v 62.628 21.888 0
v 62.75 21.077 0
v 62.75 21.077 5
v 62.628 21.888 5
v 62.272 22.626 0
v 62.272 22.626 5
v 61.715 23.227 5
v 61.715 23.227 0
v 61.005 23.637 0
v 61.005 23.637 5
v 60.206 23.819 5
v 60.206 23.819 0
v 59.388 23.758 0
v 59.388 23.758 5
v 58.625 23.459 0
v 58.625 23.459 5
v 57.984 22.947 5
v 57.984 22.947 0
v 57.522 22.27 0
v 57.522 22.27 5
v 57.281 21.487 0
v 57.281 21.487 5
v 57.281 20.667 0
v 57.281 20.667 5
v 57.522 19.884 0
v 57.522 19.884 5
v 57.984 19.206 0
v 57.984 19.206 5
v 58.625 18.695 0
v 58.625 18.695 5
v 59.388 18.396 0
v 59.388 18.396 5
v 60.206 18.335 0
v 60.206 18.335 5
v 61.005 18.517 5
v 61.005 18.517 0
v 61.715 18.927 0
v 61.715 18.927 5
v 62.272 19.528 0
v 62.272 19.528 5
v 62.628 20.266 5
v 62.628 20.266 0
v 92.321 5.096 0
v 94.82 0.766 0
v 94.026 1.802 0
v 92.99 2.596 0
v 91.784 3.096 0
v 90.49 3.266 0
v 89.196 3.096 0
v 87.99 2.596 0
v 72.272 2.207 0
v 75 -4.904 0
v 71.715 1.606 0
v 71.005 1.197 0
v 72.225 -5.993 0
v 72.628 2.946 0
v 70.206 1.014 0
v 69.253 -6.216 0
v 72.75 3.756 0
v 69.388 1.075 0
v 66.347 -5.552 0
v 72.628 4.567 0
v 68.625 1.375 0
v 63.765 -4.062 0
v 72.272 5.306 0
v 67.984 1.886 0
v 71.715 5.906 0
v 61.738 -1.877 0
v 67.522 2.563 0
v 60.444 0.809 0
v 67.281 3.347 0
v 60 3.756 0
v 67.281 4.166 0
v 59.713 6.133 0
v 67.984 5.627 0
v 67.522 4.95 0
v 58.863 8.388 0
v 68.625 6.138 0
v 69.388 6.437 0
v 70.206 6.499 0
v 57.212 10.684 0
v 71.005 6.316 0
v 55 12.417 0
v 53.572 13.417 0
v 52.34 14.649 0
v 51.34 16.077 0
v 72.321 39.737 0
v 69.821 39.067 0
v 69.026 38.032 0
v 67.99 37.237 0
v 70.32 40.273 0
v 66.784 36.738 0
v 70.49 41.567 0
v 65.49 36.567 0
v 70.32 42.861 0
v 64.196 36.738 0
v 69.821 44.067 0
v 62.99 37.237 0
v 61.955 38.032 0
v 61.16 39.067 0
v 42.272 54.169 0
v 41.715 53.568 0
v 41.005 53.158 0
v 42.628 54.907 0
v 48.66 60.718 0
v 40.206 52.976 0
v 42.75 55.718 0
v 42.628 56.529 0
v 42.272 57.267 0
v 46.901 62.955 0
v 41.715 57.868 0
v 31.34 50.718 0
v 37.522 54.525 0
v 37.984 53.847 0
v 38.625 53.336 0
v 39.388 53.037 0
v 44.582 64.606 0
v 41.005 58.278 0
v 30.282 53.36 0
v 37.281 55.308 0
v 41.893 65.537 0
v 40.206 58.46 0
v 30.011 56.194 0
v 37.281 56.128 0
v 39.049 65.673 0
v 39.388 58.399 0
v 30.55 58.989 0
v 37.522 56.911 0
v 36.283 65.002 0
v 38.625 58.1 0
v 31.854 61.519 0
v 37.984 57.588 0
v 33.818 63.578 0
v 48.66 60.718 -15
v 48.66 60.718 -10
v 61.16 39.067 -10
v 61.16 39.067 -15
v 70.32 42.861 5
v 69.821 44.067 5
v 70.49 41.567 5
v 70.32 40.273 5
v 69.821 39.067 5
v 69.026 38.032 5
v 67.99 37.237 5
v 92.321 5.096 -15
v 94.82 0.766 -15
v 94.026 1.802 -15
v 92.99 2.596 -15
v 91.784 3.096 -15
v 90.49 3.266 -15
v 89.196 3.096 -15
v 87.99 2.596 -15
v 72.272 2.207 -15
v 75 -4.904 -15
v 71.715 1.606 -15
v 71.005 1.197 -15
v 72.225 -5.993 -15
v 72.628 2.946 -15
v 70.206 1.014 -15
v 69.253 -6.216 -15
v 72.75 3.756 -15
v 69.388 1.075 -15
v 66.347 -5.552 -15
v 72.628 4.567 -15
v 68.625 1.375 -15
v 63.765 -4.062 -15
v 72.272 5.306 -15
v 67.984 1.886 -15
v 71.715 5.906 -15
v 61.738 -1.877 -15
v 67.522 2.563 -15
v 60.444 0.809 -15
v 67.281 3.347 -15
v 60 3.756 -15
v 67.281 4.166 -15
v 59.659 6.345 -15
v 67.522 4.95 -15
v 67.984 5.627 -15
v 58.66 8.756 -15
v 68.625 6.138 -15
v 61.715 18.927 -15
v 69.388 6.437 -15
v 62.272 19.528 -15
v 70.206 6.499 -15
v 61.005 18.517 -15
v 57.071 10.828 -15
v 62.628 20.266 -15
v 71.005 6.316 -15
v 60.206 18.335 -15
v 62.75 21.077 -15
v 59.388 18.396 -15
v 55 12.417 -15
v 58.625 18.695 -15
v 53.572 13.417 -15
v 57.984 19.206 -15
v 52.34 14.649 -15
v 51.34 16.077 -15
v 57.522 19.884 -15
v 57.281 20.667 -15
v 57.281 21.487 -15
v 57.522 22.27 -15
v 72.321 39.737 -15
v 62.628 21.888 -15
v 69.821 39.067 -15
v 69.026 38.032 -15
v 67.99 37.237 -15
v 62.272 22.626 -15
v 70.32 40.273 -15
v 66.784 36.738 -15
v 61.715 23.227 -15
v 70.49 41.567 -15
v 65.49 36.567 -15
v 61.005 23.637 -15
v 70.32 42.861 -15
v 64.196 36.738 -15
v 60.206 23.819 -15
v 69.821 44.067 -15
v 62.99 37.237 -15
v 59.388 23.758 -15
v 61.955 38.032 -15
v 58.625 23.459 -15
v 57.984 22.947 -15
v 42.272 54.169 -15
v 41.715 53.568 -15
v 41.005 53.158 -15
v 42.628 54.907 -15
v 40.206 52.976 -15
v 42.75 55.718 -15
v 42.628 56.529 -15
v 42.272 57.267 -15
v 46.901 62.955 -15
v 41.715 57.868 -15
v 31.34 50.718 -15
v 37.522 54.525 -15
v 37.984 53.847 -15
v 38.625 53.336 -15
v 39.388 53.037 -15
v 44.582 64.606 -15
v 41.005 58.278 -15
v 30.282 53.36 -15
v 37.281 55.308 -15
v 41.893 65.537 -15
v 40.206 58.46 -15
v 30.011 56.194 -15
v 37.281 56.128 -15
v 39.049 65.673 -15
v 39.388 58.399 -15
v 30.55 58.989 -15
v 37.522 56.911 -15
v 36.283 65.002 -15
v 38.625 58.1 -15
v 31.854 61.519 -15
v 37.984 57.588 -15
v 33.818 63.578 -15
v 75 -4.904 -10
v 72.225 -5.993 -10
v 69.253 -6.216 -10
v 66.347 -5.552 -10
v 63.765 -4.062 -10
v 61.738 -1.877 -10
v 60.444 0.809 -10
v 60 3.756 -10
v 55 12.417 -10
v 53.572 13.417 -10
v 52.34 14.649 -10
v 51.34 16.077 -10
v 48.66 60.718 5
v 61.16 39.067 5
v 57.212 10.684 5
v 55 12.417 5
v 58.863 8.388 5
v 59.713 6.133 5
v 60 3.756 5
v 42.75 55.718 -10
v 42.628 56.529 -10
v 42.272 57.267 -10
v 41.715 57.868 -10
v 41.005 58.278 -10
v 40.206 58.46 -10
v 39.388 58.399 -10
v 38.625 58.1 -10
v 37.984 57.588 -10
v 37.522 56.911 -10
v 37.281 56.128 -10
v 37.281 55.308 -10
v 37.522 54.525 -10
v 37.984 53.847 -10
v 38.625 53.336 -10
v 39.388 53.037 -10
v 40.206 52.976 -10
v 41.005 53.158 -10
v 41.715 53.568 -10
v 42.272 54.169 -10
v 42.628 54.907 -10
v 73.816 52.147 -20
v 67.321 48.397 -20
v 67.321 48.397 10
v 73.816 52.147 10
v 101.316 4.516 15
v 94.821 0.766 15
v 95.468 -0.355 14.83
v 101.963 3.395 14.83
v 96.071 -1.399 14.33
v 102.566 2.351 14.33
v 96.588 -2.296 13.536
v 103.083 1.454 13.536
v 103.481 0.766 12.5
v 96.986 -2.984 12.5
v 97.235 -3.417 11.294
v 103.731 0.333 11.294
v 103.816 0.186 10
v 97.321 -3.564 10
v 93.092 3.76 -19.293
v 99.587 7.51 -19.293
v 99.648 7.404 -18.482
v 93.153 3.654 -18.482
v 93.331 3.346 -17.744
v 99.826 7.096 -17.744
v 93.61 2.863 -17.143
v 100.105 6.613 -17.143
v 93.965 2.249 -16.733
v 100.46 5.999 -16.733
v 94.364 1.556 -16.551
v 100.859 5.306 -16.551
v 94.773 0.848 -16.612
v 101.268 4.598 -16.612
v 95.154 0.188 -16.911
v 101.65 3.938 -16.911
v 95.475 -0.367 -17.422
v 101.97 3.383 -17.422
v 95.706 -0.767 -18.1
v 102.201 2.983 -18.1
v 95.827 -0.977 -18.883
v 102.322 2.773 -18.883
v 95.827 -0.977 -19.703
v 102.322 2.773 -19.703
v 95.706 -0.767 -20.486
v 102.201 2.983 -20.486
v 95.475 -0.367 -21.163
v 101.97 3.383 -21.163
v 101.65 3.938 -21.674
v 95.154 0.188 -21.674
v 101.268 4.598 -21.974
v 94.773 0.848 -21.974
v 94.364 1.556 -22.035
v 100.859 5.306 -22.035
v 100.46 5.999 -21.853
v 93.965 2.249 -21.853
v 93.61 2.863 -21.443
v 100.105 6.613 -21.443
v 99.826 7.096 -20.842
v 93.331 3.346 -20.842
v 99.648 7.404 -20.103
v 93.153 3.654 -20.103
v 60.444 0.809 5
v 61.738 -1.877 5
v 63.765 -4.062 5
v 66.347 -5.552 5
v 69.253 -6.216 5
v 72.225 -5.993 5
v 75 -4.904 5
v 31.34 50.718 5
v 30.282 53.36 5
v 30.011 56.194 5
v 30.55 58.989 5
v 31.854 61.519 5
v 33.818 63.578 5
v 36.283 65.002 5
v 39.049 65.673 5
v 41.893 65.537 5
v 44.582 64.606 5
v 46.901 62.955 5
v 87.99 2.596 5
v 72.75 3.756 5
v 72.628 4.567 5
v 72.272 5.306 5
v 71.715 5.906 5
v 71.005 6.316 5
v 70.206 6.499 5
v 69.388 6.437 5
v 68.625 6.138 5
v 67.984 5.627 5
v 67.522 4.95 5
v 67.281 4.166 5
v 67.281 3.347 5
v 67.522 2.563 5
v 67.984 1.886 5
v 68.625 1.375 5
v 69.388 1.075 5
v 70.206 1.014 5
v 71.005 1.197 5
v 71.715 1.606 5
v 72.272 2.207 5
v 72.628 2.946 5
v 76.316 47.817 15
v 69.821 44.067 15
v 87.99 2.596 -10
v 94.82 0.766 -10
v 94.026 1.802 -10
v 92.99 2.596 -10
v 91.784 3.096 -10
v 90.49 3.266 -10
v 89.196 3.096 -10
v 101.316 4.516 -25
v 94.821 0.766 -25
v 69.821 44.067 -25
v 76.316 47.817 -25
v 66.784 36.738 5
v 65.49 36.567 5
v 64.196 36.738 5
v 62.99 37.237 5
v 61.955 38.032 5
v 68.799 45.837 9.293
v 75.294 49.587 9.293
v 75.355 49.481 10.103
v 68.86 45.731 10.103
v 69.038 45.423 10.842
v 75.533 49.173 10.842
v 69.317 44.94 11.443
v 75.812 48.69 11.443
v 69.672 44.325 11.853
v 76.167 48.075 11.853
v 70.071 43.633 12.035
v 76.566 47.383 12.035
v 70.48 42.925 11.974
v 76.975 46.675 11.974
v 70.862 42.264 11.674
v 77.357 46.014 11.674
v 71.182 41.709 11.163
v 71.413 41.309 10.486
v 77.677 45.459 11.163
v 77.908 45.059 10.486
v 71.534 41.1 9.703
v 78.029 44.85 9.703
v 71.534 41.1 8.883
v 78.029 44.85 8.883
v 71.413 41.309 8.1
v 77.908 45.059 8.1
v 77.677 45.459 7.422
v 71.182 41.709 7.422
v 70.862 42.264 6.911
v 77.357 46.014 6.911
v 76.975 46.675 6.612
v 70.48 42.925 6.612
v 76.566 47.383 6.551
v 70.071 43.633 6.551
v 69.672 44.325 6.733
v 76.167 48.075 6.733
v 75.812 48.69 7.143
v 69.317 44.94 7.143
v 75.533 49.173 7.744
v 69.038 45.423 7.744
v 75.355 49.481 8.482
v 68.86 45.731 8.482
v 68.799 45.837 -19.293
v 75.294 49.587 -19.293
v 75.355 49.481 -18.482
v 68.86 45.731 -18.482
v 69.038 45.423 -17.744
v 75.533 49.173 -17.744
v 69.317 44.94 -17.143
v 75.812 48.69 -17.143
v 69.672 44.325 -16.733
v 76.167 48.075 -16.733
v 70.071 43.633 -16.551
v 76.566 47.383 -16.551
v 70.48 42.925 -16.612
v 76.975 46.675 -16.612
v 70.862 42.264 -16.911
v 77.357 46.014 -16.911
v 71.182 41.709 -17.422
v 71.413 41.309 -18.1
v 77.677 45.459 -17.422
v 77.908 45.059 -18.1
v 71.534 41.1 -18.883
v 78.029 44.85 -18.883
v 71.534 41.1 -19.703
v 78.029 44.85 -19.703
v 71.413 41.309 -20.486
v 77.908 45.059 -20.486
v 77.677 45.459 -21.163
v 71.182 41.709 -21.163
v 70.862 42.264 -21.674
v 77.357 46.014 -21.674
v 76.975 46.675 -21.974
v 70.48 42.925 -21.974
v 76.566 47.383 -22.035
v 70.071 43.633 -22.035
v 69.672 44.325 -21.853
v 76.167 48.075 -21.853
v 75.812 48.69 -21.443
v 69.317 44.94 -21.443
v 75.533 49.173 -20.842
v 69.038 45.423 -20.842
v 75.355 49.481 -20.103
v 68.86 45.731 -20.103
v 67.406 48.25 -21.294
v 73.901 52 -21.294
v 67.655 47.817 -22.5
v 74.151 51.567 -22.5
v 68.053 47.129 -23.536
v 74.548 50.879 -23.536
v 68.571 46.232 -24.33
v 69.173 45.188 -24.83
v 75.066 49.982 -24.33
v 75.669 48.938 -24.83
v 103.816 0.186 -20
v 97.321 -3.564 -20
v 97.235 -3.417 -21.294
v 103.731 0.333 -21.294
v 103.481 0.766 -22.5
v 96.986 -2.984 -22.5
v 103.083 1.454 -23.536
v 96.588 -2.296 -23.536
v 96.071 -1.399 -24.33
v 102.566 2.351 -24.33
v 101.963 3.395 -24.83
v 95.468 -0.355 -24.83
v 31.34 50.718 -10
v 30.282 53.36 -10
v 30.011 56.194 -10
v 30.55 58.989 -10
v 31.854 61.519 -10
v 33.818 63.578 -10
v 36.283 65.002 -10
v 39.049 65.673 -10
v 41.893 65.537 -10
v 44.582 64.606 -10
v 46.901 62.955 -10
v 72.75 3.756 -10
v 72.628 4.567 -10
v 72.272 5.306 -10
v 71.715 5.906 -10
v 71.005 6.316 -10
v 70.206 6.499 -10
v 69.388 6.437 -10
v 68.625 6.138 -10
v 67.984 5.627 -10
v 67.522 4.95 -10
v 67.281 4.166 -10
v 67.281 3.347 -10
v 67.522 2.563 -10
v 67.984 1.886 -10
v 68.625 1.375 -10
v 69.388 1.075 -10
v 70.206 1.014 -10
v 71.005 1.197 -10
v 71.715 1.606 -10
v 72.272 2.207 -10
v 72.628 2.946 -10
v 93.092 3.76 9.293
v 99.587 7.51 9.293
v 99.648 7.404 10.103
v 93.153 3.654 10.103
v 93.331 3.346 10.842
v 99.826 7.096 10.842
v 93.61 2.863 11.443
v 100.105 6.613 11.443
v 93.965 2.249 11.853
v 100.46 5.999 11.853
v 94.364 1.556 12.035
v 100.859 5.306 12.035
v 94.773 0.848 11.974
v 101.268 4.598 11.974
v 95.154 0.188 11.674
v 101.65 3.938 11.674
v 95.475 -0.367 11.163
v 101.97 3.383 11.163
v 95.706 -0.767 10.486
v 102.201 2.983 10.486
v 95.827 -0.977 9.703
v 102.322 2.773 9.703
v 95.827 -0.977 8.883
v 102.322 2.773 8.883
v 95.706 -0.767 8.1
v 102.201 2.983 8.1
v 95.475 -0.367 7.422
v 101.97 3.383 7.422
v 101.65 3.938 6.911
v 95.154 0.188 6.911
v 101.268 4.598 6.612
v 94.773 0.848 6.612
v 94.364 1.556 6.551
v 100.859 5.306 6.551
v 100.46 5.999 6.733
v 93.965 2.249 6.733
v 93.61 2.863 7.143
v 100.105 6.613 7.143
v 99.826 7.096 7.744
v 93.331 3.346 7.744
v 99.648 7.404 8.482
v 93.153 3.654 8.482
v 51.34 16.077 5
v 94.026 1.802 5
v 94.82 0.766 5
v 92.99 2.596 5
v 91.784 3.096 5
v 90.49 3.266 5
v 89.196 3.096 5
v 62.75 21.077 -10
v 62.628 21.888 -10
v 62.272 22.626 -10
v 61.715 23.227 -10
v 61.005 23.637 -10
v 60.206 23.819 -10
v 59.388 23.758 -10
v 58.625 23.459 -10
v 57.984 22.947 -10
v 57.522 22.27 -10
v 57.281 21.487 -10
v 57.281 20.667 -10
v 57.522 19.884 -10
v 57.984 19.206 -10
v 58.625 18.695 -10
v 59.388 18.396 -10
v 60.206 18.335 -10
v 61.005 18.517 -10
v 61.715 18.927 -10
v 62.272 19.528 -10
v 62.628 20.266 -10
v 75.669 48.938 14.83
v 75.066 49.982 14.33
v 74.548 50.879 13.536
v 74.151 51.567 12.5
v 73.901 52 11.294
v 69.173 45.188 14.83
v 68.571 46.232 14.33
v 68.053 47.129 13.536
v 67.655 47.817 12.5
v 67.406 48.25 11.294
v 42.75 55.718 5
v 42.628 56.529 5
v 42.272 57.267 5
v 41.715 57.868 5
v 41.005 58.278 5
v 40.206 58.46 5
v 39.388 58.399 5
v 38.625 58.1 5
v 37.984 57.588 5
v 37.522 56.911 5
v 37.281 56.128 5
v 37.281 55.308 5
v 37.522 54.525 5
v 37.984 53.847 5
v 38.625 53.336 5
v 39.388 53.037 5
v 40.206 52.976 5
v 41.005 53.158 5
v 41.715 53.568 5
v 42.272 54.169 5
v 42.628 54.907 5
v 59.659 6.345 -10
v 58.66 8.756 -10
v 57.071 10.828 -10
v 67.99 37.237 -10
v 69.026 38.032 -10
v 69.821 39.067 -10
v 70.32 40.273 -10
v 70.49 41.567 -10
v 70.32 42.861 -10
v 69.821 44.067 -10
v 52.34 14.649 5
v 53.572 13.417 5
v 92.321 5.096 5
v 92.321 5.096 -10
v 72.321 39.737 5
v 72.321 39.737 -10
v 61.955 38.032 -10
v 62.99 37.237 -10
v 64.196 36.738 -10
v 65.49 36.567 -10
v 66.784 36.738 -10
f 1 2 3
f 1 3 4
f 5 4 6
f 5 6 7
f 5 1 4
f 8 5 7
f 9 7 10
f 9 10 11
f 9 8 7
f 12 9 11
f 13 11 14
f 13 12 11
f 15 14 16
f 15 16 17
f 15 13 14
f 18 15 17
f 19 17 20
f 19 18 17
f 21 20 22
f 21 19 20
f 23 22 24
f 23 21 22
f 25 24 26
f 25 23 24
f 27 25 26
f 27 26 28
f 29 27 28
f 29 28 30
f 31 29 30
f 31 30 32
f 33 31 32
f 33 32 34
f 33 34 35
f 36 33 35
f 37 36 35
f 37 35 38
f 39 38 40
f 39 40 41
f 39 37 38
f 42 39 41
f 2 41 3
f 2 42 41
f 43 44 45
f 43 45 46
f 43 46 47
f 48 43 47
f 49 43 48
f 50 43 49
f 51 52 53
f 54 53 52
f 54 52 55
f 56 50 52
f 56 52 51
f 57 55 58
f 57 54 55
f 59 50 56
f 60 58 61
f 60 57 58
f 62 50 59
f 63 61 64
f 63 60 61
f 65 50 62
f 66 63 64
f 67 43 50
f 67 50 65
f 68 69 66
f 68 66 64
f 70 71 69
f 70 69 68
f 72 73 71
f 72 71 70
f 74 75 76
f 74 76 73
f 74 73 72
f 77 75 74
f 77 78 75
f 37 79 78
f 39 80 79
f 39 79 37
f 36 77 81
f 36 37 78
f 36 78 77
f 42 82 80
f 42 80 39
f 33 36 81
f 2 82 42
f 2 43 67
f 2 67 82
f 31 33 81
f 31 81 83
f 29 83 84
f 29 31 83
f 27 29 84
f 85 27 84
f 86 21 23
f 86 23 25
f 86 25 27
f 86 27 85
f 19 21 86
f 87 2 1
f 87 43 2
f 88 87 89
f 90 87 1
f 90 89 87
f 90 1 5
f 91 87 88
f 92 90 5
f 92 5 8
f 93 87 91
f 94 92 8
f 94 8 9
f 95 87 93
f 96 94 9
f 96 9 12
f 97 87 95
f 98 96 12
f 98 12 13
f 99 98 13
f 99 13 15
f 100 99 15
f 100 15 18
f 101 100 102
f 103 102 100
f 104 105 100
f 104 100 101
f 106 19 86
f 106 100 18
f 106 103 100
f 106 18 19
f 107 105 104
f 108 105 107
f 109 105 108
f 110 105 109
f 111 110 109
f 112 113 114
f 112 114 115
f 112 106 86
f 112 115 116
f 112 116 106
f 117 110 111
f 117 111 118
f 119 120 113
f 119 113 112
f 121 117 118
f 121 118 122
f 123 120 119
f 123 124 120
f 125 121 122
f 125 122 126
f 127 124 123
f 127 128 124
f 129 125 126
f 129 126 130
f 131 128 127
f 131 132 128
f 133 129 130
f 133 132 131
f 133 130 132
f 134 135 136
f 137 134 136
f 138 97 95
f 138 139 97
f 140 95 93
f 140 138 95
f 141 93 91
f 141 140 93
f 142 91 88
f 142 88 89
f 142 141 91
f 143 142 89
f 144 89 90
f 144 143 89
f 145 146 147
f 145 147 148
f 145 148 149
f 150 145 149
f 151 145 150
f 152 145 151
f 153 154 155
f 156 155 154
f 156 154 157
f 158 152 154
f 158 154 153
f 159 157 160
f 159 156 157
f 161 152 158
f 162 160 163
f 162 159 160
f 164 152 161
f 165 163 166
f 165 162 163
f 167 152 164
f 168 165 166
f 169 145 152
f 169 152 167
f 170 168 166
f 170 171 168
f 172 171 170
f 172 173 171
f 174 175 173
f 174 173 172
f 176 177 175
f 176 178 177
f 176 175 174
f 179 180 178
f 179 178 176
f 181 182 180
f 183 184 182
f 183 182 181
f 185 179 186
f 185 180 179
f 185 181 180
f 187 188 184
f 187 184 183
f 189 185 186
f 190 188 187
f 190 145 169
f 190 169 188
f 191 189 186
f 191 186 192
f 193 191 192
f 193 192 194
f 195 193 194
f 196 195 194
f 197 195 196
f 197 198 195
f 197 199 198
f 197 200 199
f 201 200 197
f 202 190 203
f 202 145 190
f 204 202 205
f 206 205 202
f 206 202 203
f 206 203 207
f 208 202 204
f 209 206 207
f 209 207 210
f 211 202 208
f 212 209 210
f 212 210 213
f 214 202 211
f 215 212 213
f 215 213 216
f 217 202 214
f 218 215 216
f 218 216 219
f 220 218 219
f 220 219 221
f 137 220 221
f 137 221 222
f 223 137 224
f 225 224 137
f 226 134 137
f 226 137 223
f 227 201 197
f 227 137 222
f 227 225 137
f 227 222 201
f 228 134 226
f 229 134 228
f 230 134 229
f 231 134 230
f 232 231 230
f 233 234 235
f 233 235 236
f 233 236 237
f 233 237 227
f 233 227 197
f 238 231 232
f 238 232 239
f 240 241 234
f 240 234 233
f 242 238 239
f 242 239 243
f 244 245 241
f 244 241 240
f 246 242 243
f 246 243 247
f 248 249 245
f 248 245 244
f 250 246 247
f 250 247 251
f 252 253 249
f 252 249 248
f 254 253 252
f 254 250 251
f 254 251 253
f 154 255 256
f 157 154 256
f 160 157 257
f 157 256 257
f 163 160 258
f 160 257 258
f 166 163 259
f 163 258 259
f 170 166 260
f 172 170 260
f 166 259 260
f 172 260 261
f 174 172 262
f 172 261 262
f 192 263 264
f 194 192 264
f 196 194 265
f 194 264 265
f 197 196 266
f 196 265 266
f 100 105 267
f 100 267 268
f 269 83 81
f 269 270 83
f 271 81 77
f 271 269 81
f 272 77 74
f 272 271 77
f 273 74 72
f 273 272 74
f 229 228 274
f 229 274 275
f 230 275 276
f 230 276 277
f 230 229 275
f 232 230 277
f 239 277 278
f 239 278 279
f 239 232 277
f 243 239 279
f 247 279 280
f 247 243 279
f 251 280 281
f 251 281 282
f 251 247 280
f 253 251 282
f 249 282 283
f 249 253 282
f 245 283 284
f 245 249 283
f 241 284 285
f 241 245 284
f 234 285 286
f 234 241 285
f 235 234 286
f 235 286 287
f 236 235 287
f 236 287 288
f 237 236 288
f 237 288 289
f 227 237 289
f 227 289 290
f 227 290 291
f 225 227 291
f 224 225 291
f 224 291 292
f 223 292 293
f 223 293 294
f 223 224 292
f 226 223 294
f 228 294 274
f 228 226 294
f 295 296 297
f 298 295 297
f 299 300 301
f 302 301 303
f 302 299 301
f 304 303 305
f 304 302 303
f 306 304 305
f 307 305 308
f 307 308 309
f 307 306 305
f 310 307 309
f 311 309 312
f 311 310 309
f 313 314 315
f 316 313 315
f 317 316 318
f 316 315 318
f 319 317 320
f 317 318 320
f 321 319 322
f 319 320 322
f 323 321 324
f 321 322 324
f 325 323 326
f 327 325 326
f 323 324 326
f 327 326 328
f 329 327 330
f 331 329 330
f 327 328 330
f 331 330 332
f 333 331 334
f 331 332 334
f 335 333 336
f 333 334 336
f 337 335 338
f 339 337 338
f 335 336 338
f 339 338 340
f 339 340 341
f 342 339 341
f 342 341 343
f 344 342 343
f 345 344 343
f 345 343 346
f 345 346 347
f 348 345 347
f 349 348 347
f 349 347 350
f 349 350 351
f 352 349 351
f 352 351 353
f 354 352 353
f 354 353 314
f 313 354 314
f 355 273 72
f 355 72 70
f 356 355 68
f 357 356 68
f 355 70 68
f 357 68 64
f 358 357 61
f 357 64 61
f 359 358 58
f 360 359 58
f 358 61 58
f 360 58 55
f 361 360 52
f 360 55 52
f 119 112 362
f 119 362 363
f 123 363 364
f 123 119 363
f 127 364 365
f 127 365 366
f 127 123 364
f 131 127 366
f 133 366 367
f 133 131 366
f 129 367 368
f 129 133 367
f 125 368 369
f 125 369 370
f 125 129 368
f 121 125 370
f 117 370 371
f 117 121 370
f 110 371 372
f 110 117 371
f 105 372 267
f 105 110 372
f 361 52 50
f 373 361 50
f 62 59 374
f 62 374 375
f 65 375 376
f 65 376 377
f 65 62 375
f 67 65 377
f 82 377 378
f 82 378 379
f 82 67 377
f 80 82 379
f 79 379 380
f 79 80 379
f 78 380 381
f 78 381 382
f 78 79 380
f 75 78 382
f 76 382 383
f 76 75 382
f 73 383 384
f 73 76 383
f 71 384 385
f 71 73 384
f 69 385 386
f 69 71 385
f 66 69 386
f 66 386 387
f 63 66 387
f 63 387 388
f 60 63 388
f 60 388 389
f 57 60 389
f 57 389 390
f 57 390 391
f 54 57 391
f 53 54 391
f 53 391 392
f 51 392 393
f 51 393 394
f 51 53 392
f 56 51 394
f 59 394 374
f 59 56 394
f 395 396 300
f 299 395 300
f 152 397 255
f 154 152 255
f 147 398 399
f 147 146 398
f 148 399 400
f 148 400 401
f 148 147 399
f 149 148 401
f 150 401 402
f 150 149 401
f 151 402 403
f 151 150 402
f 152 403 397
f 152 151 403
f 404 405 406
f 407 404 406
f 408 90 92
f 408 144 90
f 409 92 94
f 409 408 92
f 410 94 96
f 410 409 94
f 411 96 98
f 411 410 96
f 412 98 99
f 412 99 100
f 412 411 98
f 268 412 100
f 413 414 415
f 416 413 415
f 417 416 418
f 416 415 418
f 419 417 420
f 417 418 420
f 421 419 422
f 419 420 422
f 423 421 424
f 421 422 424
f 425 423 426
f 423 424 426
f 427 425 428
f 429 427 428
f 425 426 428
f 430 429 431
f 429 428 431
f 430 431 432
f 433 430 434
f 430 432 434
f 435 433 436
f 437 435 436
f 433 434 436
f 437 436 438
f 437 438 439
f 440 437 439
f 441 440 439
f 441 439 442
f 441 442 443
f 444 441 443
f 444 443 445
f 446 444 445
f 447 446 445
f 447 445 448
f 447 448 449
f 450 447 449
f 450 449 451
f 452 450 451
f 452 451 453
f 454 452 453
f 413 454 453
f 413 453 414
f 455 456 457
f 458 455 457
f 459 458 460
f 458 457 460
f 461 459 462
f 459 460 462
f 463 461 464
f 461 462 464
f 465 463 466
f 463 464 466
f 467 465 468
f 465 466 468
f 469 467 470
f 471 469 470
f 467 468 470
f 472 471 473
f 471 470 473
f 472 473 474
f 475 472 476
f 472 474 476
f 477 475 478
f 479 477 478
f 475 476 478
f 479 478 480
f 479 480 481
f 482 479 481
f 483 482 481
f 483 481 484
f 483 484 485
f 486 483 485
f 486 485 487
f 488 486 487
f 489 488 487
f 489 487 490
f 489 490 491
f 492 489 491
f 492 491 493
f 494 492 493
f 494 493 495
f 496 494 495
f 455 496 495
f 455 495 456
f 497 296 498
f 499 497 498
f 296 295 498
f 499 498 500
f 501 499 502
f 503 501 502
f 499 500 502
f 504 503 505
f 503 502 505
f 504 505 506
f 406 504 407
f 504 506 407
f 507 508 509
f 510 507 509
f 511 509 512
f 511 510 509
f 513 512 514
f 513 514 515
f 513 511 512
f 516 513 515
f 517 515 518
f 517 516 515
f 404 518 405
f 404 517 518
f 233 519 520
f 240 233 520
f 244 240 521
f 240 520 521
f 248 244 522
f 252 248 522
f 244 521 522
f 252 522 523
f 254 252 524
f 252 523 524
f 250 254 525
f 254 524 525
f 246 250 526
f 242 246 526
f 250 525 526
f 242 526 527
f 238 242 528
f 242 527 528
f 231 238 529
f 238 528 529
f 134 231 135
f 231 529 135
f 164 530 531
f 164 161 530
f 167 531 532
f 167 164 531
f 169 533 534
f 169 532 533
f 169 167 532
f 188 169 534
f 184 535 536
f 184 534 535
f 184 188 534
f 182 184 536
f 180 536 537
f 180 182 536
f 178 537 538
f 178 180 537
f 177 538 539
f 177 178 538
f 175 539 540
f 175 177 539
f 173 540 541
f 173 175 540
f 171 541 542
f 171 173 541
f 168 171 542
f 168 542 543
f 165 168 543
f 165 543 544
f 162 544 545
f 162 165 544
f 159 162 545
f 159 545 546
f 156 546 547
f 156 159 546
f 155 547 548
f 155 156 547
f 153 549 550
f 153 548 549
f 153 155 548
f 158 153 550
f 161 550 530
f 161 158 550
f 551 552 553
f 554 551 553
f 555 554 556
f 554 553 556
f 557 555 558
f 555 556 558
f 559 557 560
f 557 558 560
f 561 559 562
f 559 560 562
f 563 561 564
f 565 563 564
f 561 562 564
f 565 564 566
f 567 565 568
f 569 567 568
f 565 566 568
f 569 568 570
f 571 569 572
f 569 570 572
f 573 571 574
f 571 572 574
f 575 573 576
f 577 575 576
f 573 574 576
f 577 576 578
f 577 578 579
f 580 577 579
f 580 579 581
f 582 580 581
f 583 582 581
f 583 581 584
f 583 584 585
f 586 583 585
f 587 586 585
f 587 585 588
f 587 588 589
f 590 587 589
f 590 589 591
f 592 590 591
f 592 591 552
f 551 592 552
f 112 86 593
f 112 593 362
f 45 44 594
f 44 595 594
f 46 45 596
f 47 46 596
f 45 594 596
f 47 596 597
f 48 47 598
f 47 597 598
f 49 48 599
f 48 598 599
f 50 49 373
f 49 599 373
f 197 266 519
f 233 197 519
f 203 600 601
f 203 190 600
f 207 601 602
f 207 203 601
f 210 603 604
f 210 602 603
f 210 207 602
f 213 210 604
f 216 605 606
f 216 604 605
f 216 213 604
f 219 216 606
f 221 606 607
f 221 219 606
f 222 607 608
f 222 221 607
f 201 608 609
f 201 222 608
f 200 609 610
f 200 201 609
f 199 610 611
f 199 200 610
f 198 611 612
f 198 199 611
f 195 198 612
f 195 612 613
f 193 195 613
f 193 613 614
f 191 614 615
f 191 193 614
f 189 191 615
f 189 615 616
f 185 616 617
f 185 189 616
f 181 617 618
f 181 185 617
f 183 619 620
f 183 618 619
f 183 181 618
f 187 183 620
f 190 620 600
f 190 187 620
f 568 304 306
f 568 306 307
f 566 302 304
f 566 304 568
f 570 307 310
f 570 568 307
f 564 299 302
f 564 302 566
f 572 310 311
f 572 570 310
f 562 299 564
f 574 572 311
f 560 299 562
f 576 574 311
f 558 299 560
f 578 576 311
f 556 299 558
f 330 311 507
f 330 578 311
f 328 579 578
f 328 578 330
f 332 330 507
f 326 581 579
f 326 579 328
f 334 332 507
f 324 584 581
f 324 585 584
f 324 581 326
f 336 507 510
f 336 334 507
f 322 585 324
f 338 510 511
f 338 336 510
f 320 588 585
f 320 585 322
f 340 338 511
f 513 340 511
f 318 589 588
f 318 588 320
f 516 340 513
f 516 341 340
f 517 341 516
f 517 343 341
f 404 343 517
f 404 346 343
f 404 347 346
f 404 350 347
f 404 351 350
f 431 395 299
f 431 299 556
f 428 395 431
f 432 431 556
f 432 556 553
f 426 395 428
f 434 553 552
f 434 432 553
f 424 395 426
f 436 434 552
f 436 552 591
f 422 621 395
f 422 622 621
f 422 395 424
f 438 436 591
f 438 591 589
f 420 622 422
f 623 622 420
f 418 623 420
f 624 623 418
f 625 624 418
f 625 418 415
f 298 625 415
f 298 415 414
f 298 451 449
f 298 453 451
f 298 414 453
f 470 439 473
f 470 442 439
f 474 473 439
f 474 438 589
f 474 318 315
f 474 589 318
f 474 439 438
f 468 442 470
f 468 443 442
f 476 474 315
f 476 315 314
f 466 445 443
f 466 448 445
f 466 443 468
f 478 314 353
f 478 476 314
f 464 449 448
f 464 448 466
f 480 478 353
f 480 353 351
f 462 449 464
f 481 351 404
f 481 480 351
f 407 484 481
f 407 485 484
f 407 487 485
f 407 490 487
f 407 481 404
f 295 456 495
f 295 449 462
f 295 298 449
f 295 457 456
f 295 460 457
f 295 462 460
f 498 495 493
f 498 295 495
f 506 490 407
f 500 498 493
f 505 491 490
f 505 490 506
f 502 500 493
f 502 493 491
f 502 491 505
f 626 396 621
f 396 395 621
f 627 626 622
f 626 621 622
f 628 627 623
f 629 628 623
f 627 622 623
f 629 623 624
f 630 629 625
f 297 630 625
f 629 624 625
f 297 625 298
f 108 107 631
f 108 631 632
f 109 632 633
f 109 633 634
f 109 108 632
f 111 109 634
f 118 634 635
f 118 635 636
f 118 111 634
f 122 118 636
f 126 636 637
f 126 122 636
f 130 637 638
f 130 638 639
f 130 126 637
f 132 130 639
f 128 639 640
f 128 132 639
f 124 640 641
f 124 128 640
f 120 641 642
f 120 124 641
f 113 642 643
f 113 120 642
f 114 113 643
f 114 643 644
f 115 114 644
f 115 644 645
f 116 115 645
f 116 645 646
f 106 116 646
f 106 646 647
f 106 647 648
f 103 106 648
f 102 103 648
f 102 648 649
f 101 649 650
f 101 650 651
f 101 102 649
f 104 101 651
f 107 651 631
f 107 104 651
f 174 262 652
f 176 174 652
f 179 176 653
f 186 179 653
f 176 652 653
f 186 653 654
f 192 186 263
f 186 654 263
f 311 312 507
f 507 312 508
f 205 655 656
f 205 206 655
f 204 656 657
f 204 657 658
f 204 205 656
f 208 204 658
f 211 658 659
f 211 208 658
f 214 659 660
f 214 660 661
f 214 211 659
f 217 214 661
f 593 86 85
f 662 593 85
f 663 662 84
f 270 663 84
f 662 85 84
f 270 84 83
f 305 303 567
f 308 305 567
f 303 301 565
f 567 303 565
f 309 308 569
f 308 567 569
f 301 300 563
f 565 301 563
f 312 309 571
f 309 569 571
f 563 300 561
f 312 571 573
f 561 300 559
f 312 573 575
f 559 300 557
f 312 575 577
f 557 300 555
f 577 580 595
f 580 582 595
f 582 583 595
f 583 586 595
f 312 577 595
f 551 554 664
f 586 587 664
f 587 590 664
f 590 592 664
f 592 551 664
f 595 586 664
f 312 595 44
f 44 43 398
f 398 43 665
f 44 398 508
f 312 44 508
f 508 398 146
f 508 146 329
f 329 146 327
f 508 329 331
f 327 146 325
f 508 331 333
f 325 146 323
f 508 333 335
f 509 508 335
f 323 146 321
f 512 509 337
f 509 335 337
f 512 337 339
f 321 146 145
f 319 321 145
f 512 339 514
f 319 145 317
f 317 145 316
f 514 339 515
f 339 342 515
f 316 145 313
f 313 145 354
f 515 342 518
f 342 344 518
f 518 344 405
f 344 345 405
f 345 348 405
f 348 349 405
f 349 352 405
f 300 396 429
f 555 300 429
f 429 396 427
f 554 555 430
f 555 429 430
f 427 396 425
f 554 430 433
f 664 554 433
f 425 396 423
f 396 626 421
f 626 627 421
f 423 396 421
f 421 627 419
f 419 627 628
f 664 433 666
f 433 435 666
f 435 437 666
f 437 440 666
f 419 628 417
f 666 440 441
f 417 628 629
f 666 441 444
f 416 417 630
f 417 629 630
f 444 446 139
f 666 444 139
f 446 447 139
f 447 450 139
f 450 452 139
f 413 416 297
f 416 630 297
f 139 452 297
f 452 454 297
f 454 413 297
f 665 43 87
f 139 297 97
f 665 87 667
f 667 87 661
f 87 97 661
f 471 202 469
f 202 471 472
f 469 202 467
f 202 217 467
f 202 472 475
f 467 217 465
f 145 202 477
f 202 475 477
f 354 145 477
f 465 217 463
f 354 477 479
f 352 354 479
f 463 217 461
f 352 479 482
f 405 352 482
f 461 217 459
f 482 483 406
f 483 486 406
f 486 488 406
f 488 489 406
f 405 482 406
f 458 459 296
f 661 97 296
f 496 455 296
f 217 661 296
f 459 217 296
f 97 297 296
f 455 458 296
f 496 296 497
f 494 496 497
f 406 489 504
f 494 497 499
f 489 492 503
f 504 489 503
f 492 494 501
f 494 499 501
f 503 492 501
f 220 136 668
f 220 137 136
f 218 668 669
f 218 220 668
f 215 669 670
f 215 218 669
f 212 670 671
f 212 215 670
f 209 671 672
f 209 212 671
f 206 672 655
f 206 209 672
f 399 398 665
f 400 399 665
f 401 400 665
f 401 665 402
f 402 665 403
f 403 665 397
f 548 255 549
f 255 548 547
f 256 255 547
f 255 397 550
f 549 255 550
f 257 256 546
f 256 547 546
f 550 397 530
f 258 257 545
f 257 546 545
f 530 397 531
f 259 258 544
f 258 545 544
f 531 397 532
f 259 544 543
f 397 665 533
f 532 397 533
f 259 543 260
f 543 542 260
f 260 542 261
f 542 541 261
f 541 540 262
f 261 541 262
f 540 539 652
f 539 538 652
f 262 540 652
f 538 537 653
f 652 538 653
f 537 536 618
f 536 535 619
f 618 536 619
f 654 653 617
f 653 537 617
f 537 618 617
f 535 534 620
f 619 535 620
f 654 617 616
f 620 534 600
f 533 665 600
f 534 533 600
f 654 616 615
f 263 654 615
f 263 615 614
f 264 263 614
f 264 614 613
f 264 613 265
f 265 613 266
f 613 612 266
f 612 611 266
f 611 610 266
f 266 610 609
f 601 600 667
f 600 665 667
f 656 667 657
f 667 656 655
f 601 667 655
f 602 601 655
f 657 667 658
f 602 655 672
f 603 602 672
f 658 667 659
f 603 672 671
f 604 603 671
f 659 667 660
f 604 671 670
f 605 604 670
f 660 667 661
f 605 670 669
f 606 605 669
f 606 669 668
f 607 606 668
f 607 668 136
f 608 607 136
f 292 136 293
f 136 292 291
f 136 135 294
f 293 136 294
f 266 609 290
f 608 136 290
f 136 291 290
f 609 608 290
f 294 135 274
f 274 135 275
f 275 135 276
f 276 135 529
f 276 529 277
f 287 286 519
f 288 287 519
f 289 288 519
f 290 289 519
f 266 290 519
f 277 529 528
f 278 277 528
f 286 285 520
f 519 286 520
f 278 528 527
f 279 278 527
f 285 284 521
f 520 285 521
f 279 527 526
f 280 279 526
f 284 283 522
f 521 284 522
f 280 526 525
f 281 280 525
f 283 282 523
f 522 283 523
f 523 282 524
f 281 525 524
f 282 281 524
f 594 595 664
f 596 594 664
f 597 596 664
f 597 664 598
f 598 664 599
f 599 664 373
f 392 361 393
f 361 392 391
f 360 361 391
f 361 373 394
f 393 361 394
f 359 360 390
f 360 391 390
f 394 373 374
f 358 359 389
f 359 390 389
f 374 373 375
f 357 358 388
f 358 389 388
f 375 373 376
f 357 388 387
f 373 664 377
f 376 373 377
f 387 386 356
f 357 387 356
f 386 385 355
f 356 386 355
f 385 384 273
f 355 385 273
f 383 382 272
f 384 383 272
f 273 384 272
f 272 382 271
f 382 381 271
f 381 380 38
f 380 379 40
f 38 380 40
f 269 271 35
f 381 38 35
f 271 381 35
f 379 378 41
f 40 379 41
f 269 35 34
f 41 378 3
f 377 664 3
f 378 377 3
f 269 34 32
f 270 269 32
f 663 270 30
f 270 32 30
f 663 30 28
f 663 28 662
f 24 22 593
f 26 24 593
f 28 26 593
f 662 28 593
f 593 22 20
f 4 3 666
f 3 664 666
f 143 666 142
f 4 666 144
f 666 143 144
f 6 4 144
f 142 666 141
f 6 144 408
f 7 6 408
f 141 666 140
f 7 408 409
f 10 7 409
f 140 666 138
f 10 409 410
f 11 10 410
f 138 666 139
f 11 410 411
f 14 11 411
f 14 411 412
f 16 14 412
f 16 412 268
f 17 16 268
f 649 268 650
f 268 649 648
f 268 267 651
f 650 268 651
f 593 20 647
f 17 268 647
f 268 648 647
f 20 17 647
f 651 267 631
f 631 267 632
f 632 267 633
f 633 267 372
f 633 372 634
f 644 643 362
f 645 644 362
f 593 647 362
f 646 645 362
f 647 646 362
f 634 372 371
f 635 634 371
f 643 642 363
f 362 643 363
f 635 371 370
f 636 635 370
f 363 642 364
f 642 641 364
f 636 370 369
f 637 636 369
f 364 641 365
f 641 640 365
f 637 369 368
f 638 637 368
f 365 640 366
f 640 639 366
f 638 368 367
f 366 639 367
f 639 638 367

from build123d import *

# Parameters (mm, degrees)
SKETCH7_R               = 2.75
BOSS_EXTRUDE5_DEPTH     = 5
FILLET4_R               = 10
SKETCH8_R               = 2.75
BOSS_EXTRUDE6_DEPTH     = 5
SKETCH9_W               = 10
SKETCH9_H               = 10
SKETCH9_H_2             = 40
SKETCH9_W_2             = 5
BOSS_EXTRUDE7_DEPTH     = 7.5
FILLET5_R               = 5
SKETCH10_R              = 2.75
CUT_EXTRUDE3_DEPTH      = 64.495460213
SKETCH11_R              = 2.75
BOSS_EXTRUDE8_DEPTH     = 5
BOSS_EXTRUDE9_DEPTH     = 5
FILLET6_R               = 5
CUT_EXTRUDE4_START      = -5
SKETCH13_R              = 2.75
CUT_EXTRUDE4_DEPTH      = 5
CUT_EXTRUDE5_DEPTH      = 127.477470595
CUT_EXTRUDE5_DEPTH_BACK = 127.477470595
SKETCH14_R              = 2.75


with BuildPart() as part:
    # Sketch7 → Boss-Extrude5 (new body)
    with BuildSketch(Plane.XY):
        with BuildLine():
            Line((72.320508076, 39.737205584), (55, 29.737205584))
            ThreePointArc((55, 29.737205584), (51.339745962, 16.076951546), (65, 12.416697508))
            ThreePointArc((65, 12.416697508), (61.339745962, -1.24355653), (75, -4.903810568))
            Line((75, -4.903810568), (92.320508076, 5.096189432))
            Line((92.320508076, 5.096189432), (72.320508076, 39.737205584))
        make_face()
        with Locations((70, 3.75644347)):
            Circle(SKETCH7_R, mode=Mode.SUBTRACT)
        with Locations((60, 21.076951546)):
            Circle(SKETCH7_R, mode=Mode.SUBTRACT)
    extrude(amount=BOSS_EXTRUDE5_DEPTH)

    # Fillet4
    fillet4_edges = [part.edges().sort_by_distance(p)[0] for p in [
        (65, 12.416697508, 2.5),
    ]]
    fillet(fillet4_edges, radius=FILLET4_R)



with BuildPart() as body_2:
    # Sketch8 → Boss-Extrude6 (new body)
    with BuildSketch(Plane(origin=(0, 0, -10), x_dir=(-1, 0, 0), z_dir=(0, 0, -1))):
        with BuildLine():
            Line((-55, 29.737205584), (-72.320508076, 39.737205584))
            Line((-72.320508076, 39.737205584), (-92.320508076, 5.096189432))
            Line((-92.320508076, 5.096189432), (-75, -4.903810568))
            ThreePointArc((-75, -4.903810568), (-65, -4.903810568), (-60, 3.75644347))
            ThreePointArc((-60, 3.75644347), (-58.660254038, 8.75644347), (-55, 12.416697508))
            ThreePointArc((-55, 12.416697508), (-50, 21.076951546), (-55, 29.737205584))
        make_face()
        with Locations(Location((-70, 3.75644347, 0), (0, 0, 180))):
            Circle(SKETCH8_R, mode=Mode.SUBTRACT)
        with Locations(Location((-60, 21.076951546, 0), (0, 0, 180))):
            Circle(SKETCH8_R, mode=Mode.SUBTRACT)
    extrude(amount=BOSS_EXTRUDE6_DEPTH)


with BuildPart() as part_1:
    add(part.part)

    add(body_2.part)  # Boss-Extrude7 merges body 2
    # Sketch9 → Boss-Extrude7 (add)
    with BuildSketch(Plane(origin=(71.447095812, 41.25, 0), x_dir=(0, 0, -1), z_dir=(0.8660254037844416, 0.4999999999999949, 0))):
        with Locations((5, 3.253175473)):
            Rectangle(SKETCH9_W, SKETCH9_H)
        Polygon((0, 8.253175473), (-15, 8.253175473), (-15, -51.746824527), (25, -51.746824527), (25, 8.253175473), (10, 8.253175473), (10, -1.746824527), (15, -1.746824527), (15, -41.746824527), (10, -41.746824527), (0, -41.746824527), (-5, -41.746824527), (-5, -1.746824527), (0, -1.746824527), align=None)
        with Locations((5, -21.746824527)):
            Rectangle(SKETCH9_W, SKETCH9_H_2)
        with Locations((12.5, -21.746824527)):
            Rectangle(SKETCH9_W_2, SKETCH9_H_2)
        with Locations((-2.5, -21.746824527)):
            Rectangle(SKETCH9_W_2, SKETCH9_H_2)
    extrude(amount=BOSS_EXTRUDE7_DEPTH)

    # Fillet5
    fillet5_edges = [part_1.edges().sort_by_distance(p)[0] for p in [
        (70.56810334, 50.272459622, -25),
        (70.56810334, 50.272459622, 15),
        (100.56810334, -1.689064606, 15),
        (100.56810334, -1.689064606, -25),
    ]]
    fillet(fillet5_edges, radius=FILLET5_R)

    # Sketch10 → Cut-Extrude3 (cut, through all)
    with BuildSketch(Plane(origin=(77.942286341, 45, 0), x_dir=(0, 0, -1), z_dir=(0.8660254037844415, 0.4999999999999951, 0))):
        with Locations(Location((-9.292893219, 2.546068692, 0), (0, 0, 90))):
            Circle(SKETCH10_R)
        with Locations(Location((19.292893219, 2.546068692, 0), (0, 0, 90))):
            Circle(SKETCH10_R)
        with Locations(Location((19.292893219, -46.039717746, 0), (0, 0, 90))):
            Circle(SKETCH10_R)
        with Locations(Location((-9.292893219, -46.039717746, 0), (0, 0, 90))):
            Circle(SKETCH10_R)
    extrude(amount=-CUT_EXTRUDE3_DEPTH, mode=Mode.SUBTRACT)

    # Sketch11 → Boss-Extrude8 (add)
    with BuildSketch(Plane.XY):
        with BuildLine():
            Line((48.660254038, 60.717967697), (68.660254038, 26.076951546))
            ThreePointArc((68.660254038, 26.076951546), (65, 12.416697508), (51.339745962, 16.076951546))
            Line((51.339745962, 16.076951546), (31.339745962, 50.717967697))
            ThreePointArc((31.339745962, 50.717967697), (35, 64.378221735), (48.660254038, 60.717967697))
        make_face()
        with Locations((40, 55.717967697)):
            Circle(SKETCH11_R, mode=Mode.SUBTRACT)
        with Locations((60, 21.076951546)):
            Circle(SKETCH11_R, mode=Mode.SUBTRACT)
    extrude(amount=BOSS_EXTRUDE8_DEPTH)

    # Sketch12 → Boss-Extrude9 (add)
    with BuildSketch(Plane(origin=(0, 0, -10), x_dir=(-1, 0, 0), z_dir=(0, 0, -1))):
        with BuildLine():
            Line((-48.660254038, 60.717967697), (-63.660254038, 34.737205584))
            Line((-63.660254038, 34.737205584), (-72.320508076, 39.737205584))
            Line((-72.320508076, 39.737205584), (-92.320508076, 5.096189432))
            Line((-92.320508076, 5.096189432), (-75, -4.903810568))
            ThreePointArc((-75, -4.903810568), (-65, -4.903810568), (-60, 3.75644347))
            ThreePointArc((-60, 3.75644347), (-58.660254038, 8.75644347), (-55, 12.416697508))
            ThreePointArc((-55, 12.416697508), (-52.928932188, 14.005883734), (-51.339745962, 16.076951546))
            Line((-51.339745962, 16.076951546), (-31.339745962, 50.717967697))
            ThreePointArc((-31.339745962, 50.717967697), (-35, 64.378221735), (-48.660254038, 60.717967697))
        make_face()
    extrude(amount=BOSS_EXTRUDE9_DEPTH)

    # Fillet6
    fillet6_edges = [part_1.edges().sort_by_distance(p)[0] for p in [
        (92.320508076, 5.096189432, -12.5),
        (92.320508076, 5.096189432, 2.5),
        (72.320508076, 39.737205584, -12.5),
        (72.320508076, 39.737205584, 2.5),
        (63.660254038, 34.737205584, -12.5),
        (63.660254038, 34.737205584, 2.5),
    ]]
    fillet(fillet6_edges, radius=FILLET6_R - 0.0001)  # a hair under: the kernel refuses the full size

    # Sketch13 → Cut-Extrude4 (cut)
    with BuildSketch(Plane.XY.offset(-10).offset(CUT_EXTRUDE4_START)):
        with Locations((40, 55.717967697)):
            Circle(SKETCH13_R)
    extrude(amount=CUT_EXTRUDE4_DEPTH, mode=Mode.SUBTRACT)

    # Sketch14 → Cut-Extrude5 (cut, two sides: drawn at the far end of the back side and taken through both)
    with BuildSketch(Plane.XY.offset(5).offset(-CUT_EXTRUDE5_DEPTH_BACK)):
        with Locations((60, 21.076951546)):
            Circle(SKETCH14_R)
        with Locations((70, 3.75644347)):
            Circle(SKETCH14_R)
    extrude(amount=CUT_EXTRUDE5_DEPTH + CUT_EXTRUDE5_DEPTH_BACK, mode=Mode.SUBTRACT)


solid = part_1.part
